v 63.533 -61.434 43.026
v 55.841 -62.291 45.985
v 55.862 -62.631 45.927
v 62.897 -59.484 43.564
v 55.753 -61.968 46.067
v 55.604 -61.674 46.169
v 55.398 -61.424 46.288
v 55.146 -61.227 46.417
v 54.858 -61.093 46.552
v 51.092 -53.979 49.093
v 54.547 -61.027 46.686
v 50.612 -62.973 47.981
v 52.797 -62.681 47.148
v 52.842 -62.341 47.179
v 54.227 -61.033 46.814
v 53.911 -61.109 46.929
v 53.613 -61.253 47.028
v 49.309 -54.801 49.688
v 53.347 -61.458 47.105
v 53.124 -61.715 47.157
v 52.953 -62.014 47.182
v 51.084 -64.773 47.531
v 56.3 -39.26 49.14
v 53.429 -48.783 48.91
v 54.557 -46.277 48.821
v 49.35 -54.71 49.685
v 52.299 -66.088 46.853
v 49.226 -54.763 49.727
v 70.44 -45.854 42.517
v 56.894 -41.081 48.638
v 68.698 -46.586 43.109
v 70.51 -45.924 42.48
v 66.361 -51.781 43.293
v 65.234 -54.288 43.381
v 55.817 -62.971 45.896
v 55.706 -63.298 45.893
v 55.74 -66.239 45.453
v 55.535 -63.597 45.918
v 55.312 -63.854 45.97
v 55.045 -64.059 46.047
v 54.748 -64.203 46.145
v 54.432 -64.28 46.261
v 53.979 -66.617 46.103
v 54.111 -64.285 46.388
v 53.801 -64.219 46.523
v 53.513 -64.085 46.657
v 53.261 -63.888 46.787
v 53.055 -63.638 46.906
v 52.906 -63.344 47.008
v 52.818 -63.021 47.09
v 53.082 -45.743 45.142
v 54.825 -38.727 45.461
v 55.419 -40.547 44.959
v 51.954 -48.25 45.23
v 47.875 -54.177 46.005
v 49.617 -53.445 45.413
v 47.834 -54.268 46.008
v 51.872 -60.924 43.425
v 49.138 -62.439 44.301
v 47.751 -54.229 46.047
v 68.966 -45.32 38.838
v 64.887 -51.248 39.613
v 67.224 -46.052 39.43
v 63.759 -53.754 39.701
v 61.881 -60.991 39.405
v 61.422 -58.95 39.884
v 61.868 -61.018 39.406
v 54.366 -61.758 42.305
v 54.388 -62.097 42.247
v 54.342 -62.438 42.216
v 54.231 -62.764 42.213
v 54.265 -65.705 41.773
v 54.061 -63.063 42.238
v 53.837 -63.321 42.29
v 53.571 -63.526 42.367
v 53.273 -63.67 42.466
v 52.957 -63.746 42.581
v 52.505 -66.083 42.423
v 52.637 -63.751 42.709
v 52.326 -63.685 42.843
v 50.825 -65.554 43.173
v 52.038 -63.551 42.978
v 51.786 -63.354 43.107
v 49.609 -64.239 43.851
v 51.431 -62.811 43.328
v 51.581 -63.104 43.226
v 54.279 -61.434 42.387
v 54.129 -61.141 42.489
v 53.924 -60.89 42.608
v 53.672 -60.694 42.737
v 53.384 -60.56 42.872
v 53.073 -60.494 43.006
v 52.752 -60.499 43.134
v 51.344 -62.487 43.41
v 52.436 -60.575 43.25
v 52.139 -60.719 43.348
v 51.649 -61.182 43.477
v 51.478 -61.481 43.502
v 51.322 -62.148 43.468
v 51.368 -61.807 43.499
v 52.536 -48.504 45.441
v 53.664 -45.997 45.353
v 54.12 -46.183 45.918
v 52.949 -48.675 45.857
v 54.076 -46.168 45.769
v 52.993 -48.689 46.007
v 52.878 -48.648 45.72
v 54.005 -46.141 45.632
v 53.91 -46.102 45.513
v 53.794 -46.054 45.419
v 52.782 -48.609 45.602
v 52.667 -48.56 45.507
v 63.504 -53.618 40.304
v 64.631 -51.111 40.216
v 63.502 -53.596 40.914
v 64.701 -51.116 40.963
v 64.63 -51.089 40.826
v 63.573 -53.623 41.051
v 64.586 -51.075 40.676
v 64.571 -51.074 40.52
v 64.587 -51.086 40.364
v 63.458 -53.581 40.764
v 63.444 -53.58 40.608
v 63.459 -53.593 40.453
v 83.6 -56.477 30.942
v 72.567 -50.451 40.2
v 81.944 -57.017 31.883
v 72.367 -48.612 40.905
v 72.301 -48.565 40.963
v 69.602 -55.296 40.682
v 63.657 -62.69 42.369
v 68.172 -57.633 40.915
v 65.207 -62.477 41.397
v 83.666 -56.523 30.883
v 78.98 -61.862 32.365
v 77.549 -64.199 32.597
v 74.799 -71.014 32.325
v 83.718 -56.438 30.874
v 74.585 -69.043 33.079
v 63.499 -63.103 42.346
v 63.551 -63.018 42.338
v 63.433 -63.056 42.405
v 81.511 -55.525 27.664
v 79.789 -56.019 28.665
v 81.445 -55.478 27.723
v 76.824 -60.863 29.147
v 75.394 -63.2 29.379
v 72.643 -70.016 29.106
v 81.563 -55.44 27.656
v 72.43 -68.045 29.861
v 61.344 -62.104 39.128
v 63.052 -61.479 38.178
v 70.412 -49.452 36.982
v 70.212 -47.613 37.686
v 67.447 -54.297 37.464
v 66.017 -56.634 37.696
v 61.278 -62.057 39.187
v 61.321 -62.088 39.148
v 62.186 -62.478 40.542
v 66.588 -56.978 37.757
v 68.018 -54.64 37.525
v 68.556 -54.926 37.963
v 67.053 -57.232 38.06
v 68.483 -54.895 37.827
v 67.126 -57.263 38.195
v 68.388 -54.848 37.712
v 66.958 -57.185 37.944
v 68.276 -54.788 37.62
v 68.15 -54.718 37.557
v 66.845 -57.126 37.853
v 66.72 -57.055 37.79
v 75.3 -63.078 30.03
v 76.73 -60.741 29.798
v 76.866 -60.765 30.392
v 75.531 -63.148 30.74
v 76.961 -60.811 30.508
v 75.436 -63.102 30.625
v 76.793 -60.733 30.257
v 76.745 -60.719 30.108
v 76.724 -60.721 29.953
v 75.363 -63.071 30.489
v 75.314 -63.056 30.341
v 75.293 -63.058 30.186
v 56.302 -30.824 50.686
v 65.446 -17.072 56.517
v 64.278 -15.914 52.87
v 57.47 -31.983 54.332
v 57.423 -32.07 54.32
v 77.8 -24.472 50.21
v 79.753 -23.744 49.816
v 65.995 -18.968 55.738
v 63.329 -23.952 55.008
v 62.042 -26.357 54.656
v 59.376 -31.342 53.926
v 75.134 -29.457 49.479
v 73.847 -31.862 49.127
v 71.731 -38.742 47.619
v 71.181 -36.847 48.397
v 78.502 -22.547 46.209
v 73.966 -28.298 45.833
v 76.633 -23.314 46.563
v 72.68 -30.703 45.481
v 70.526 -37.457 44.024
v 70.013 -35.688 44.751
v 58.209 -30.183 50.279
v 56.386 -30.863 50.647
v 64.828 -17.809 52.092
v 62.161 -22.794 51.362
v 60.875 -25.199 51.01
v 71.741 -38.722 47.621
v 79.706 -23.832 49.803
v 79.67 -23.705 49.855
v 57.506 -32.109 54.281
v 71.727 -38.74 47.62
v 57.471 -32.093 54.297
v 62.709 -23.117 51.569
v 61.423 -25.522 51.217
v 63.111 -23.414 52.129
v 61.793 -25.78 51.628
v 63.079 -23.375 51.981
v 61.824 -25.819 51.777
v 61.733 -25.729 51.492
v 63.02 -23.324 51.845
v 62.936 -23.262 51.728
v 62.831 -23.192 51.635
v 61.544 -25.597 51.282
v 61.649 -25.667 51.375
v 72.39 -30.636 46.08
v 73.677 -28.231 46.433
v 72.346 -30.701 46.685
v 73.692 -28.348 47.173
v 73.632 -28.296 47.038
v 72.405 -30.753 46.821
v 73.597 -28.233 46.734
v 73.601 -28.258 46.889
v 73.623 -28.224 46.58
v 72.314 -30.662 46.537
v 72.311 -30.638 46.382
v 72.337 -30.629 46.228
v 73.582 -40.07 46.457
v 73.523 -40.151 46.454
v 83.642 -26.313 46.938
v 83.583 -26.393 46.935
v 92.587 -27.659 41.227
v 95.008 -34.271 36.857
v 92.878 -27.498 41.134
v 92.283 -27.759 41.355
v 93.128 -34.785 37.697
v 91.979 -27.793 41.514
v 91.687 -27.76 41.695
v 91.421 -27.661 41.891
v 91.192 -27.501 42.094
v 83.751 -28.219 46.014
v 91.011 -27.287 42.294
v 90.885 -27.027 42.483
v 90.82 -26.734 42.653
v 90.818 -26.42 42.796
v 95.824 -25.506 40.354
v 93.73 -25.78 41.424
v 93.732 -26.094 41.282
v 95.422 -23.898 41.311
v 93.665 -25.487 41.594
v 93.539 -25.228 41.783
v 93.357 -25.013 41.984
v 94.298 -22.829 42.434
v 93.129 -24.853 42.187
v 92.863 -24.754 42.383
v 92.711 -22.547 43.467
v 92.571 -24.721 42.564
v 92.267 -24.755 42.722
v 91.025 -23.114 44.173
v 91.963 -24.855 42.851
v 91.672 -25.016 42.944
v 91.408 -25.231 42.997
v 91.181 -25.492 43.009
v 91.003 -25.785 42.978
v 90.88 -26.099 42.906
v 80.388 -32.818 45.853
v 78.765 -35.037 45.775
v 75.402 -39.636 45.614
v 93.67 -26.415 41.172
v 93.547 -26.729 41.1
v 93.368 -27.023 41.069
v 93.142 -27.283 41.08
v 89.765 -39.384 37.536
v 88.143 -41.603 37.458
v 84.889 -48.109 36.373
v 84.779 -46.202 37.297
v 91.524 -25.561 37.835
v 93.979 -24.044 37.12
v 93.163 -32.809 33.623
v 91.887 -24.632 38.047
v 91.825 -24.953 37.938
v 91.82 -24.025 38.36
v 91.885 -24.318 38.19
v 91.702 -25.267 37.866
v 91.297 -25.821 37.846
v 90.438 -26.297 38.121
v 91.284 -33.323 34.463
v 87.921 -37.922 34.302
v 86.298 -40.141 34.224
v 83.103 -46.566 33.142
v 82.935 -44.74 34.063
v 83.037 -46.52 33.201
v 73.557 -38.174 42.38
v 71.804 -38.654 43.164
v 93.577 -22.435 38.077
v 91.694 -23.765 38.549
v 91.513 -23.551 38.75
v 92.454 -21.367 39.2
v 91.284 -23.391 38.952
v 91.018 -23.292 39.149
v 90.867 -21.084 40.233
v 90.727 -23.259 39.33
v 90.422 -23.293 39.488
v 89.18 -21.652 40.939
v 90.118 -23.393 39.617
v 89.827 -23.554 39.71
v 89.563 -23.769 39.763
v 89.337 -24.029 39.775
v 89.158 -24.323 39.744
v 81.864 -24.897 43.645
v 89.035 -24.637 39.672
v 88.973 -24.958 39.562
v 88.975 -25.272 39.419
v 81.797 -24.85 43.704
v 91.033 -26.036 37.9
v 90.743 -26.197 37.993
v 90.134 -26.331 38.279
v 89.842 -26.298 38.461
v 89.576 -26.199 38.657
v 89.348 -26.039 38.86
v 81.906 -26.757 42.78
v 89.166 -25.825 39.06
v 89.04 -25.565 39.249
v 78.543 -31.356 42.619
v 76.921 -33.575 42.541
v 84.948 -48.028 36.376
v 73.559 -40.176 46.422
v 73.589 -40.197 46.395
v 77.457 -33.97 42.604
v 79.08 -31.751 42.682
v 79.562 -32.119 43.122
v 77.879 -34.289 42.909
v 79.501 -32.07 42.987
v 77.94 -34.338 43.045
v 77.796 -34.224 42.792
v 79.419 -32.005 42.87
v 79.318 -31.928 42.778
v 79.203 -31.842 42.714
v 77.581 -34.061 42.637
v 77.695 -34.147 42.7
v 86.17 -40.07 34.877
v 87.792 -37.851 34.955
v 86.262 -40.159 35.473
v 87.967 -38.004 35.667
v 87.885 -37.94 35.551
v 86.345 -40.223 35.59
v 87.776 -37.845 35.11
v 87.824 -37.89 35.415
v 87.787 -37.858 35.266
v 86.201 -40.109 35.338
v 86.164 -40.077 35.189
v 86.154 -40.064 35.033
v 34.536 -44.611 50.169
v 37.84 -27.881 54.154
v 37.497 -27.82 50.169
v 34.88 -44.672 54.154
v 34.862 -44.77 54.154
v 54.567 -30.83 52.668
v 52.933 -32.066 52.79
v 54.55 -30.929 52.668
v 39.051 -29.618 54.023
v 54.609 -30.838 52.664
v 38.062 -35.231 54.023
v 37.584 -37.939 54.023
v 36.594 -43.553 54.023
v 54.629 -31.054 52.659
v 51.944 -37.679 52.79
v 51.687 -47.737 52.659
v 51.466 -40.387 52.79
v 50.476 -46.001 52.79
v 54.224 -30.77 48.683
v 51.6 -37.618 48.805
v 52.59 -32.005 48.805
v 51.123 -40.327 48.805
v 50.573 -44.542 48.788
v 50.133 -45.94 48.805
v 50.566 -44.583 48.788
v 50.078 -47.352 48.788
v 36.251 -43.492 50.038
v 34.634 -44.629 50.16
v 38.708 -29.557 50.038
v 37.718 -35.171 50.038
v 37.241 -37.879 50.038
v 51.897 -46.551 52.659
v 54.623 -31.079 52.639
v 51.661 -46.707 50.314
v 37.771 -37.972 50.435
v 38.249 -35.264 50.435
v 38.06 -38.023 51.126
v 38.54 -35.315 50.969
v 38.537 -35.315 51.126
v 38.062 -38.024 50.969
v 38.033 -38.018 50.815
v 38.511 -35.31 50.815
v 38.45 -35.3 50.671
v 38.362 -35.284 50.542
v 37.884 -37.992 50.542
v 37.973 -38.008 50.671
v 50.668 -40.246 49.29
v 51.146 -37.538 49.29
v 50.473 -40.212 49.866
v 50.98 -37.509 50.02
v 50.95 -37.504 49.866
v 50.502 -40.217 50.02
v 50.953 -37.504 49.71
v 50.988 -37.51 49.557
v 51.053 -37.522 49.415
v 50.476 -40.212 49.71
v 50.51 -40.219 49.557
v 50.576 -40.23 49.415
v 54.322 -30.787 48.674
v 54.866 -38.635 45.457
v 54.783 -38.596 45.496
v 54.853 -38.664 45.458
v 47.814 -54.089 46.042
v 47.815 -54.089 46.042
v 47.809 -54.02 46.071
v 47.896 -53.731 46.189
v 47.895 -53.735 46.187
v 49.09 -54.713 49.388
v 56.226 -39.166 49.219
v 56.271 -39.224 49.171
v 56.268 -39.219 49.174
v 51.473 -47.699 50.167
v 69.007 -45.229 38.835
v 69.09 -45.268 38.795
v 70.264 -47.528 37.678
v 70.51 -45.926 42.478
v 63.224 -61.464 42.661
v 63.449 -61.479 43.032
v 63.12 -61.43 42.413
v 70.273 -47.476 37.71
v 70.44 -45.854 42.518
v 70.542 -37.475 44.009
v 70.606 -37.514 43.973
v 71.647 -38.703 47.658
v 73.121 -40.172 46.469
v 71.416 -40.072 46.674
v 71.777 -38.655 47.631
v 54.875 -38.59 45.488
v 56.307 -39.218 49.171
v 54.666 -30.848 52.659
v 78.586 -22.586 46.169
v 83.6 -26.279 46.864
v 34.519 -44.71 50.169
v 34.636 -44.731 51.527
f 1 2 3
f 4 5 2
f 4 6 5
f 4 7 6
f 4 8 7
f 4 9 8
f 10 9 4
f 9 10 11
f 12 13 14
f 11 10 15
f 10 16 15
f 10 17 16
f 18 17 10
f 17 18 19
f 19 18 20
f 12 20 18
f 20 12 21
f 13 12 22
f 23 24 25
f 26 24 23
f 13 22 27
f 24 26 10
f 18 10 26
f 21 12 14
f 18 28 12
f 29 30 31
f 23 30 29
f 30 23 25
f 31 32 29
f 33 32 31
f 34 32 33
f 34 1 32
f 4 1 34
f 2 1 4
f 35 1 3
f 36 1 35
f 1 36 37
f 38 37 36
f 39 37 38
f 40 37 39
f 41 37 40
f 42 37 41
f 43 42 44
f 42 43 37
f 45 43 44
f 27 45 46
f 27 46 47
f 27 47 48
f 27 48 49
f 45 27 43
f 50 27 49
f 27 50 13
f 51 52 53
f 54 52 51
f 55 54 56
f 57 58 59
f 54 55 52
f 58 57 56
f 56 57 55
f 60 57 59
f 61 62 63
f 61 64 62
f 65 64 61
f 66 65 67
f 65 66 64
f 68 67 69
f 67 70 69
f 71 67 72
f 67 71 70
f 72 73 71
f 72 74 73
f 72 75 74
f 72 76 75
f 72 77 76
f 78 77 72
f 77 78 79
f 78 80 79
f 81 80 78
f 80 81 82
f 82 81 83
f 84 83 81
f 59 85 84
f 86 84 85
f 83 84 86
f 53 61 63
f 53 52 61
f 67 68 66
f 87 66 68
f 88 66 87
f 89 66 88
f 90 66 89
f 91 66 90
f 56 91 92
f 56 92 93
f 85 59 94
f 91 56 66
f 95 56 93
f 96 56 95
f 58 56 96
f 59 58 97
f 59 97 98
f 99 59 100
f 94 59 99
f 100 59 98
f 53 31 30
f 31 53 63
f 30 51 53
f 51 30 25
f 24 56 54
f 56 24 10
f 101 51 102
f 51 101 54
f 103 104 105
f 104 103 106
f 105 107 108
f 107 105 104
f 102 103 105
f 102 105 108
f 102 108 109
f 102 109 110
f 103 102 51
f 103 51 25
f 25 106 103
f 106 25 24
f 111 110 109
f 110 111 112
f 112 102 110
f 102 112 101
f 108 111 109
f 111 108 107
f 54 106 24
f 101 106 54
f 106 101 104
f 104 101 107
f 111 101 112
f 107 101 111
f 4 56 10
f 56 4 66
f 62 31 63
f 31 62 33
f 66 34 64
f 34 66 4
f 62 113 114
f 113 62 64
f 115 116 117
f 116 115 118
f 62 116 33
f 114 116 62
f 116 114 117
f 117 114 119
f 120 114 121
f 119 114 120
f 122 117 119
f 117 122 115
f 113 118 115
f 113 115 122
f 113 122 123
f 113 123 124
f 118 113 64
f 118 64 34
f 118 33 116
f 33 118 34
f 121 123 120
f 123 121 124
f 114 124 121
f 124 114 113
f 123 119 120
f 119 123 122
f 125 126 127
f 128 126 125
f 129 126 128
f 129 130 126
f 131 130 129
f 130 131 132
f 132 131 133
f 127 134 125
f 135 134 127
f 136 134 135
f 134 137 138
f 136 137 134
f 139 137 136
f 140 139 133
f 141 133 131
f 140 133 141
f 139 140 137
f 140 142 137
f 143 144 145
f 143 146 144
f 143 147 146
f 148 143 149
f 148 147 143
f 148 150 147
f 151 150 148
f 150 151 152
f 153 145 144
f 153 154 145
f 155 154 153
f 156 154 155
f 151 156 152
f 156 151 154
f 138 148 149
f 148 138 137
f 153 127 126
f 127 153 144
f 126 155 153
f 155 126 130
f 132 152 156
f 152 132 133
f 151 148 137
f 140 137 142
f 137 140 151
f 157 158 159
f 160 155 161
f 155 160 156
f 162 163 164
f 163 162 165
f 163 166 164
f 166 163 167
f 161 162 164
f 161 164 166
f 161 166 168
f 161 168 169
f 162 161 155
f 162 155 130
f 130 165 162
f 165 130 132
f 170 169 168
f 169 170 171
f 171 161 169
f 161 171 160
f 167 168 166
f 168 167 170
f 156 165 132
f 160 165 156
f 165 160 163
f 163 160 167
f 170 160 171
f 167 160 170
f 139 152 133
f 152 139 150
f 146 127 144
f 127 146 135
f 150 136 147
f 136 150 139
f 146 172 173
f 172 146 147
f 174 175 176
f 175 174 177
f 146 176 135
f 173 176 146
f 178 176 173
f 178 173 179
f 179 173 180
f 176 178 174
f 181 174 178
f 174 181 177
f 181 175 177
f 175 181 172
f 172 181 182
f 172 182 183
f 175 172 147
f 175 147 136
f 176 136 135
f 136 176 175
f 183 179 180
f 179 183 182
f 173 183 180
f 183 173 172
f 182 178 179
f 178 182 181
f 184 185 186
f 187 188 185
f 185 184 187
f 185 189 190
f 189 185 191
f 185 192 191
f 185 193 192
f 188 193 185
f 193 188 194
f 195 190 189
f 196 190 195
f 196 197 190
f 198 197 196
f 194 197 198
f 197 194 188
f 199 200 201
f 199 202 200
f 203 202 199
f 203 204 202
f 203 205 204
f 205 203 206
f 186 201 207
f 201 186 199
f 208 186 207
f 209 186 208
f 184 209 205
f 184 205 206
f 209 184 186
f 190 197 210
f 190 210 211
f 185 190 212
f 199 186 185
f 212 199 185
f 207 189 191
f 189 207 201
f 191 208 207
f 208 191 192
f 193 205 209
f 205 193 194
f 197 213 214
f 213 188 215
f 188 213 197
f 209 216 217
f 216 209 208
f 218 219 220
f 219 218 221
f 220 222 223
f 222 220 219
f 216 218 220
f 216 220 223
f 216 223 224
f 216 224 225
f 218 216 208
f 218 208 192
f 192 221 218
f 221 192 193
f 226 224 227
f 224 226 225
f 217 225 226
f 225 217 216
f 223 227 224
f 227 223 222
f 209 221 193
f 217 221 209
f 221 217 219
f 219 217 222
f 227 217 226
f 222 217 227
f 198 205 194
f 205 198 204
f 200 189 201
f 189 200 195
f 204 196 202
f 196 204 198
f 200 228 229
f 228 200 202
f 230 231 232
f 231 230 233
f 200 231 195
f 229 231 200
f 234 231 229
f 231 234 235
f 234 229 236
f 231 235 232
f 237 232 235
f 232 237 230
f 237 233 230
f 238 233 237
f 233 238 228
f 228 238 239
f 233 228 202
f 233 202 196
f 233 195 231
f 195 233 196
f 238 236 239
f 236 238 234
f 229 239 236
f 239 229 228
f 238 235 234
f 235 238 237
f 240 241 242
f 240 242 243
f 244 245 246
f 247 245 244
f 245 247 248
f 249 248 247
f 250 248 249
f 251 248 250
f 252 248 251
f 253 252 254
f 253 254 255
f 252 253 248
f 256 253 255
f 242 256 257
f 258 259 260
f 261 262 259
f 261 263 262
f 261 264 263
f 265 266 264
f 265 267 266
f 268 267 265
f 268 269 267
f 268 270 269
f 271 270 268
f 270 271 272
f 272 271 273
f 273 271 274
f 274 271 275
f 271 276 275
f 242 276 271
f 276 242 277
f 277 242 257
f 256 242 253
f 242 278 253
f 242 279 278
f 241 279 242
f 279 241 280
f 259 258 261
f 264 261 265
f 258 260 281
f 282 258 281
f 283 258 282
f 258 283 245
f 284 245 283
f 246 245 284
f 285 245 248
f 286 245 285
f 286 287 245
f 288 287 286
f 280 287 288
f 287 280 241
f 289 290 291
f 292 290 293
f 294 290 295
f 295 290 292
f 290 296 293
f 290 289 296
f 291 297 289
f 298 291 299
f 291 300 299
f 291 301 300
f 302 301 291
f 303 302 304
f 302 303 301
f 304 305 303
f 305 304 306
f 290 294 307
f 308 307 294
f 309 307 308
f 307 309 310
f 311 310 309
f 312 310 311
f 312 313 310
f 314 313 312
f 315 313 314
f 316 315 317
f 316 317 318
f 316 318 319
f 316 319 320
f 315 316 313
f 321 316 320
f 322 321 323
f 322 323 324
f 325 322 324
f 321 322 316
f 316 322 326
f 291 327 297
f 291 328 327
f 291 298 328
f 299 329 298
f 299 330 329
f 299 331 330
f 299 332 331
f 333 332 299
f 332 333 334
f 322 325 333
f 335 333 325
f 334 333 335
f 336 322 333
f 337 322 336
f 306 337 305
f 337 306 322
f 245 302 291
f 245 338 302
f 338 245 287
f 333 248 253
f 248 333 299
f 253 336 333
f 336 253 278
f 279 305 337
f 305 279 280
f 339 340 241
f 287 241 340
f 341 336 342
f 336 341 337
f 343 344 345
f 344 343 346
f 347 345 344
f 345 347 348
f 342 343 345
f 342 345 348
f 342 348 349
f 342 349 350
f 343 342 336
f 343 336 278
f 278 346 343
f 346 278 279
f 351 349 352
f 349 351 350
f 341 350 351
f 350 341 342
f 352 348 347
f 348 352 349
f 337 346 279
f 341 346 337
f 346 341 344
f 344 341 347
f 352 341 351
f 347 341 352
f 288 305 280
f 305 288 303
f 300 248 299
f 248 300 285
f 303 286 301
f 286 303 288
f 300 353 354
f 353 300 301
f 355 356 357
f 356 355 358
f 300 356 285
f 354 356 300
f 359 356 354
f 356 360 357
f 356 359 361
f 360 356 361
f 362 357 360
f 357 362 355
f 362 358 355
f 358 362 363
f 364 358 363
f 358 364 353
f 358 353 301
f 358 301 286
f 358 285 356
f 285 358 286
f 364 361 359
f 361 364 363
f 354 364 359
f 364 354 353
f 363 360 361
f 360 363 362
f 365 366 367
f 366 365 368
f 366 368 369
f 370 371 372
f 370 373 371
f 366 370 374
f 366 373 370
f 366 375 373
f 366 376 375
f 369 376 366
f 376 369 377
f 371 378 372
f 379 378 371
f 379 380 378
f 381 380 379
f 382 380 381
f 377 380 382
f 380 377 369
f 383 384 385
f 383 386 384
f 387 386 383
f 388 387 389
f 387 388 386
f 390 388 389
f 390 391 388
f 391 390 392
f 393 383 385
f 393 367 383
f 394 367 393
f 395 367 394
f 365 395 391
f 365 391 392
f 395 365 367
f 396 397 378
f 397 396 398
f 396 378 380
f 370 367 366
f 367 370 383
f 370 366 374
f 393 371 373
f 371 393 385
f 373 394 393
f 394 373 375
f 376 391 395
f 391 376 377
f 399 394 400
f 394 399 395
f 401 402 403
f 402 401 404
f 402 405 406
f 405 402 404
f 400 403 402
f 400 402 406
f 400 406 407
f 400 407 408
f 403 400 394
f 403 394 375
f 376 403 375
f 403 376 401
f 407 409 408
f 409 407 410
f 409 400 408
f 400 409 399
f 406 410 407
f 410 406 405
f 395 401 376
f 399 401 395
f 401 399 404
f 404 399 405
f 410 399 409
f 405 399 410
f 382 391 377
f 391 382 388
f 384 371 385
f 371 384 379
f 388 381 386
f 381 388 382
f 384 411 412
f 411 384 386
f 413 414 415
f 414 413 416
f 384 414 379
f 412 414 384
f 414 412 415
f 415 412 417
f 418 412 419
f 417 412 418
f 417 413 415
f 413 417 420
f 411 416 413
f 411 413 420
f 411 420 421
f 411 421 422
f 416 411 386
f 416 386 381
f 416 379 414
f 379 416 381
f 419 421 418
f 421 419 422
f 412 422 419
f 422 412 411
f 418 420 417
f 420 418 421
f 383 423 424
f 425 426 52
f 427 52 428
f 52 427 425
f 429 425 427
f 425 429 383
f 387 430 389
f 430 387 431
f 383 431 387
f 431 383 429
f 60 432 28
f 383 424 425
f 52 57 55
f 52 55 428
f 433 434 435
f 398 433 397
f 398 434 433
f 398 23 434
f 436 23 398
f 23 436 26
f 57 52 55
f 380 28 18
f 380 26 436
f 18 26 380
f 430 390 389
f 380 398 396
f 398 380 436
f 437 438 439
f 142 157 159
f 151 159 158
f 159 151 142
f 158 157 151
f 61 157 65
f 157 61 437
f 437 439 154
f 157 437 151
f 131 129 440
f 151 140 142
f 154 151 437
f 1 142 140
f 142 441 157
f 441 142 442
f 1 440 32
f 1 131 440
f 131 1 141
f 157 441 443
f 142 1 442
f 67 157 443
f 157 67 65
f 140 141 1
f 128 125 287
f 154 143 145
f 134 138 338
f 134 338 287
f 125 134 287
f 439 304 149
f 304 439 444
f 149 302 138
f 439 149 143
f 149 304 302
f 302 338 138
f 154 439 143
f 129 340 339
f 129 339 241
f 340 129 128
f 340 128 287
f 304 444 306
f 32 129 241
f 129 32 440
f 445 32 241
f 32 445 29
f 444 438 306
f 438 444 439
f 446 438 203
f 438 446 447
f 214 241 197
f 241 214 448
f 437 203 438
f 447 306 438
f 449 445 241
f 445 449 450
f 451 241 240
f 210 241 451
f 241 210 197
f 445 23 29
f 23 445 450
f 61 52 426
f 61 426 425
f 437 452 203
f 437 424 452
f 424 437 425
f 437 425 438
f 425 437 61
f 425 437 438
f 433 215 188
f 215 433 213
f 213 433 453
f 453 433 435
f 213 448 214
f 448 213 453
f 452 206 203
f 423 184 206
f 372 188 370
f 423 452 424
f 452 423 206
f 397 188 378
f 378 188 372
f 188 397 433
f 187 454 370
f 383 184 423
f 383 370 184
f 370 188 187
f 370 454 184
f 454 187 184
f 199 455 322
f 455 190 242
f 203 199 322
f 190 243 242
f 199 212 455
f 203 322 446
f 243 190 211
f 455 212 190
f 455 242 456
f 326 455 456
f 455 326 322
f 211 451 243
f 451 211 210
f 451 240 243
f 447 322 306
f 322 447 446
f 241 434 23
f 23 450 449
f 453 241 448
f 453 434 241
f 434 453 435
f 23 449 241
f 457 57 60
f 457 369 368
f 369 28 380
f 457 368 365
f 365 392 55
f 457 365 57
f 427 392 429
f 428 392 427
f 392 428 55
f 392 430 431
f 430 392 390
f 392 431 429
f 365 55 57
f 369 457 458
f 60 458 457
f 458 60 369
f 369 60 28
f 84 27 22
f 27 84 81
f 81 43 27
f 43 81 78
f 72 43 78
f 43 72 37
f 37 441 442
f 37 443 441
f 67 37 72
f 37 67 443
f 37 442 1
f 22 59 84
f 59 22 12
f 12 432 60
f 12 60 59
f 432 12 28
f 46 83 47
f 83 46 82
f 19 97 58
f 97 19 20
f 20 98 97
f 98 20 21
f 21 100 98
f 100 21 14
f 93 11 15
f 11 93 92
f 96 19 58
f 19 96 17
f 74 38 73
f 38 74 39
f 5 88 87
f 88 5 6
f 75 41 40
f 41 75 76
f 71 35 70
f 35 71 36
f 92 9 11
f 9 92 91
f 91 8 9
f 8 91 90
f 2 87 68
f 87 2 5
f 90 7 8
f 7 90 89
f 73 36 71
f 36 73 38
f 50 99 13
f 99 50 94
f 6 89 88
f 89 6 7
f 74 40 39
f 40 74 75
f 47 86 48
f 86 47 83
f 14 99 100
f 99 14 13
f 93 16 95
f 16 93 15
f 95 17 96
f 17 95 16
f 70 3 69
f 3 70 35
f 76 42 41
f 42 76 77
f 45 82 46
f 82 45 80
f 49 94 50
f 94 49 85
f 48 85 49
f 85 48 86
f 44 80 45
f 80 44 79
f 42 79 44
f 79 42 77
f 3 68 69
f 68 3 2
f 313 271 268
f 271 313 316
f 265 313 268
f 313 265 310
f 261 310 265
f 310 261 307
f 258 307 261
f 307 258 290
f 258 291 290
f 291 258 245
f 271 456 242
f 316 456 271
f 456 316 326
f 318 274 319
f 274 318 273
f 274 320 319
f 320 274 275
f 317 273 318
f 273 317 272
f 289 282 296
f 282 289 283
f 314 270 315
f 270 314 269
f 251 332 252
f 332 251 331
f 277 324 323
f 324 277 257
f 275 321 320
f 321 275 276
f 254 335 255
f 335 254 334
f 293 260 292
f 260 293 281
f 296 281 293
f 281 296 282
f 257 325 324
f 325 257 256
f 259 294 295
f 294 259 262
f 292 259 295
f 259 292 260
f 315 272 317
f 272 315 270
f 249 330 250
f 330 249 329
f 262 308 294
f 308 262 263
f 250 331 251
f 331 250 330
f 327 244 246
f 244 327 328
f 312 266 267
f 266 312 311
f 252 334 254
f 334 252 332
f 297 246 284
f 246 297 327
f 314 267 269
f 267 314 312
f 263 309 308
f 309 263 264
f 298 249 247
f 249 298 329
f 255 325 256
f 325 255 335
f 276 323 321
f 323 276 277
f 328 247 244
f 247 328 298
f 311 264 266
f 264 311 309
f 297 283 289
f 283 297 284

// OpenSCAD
mirror ([-1, 0, 0]) {
  union () {
    union () {
      union () {
        union () {
          translate ([-22, -36, -3]) {
            translate ([-36.42059678255161, -13.748592644796744, 45.42143047760381]) {
              rotate (a=25.0, v=[0, 0, 1]) {
                rotate (a=-23.000000000000004, v=[0, 1, 0]) {
                  rotate (a=-1.9999999999999998, v=[1, 0, 0]) {
                    union () {
                      union () {
                        translate ([0, 7.825, 2]) {
                          cube ([17.15, 1.5, 4], center=true);
                        }
                        translate ([7.825, 0, 2]) {
                          cube ([1.5, 17.15, 4], center=true);
                        }
                        translate ([0, 0, 0]) {
                          hull () {
                            translate ([7.825, 0, 2]) {
                              cube ([1.5, 2.75, 4], center=true);
                            }
                            translate ([7.075, 0, 1]) {
                              rotate (a=90.0, v=[1, 0, 0]) {
                                cylinder ($fn=30, h=2.75, r=0.75, center=true);
                              }
                            }
                          }
                        }
                      }
                      mirror ([0, 1, 0]) {
                        mirror ([1, 0, 0]) {
                          union () {
                            translate ([0, 7.825, 2]) {
                              cube ([17.15, 1.5, 4], center=true);
                            }
                            translate ([7.825, 0, 2]) {
                              cube ([1.5, 17.15, 4], center=true);
                            }
                            translate ([0, 0, 0]) {
                              hull () {
                                translate ([7.825, 0, 2]) {
                                  cube ([1.5, 2.75, 4], center=true);
                                }
                                translate ([7.075, 0, 1]) {
                                  rotate (a=90.0, v=[1, 0, 0]) {
                                    cylinder ($fn=30, h=2.75, r=0.75, center=true);
                                  }
                                }
                              }
                            }
                          }
                        }
                      }
                    }
                  }
                }
              }
            }
          }
          translate ([-35, -45, -12]) {
            translate ([-36.42059678255161, -13.748592644796744, 45.42143047760381]) {
              rotate (a=34.99999999999999, v=[0, 0, 1]) {
                rotate (a=-36.0, v=[0, 1, 0]) {
                  rotate (a=-6.0, v=[1, 0, 0]) {
                    union () {
                      union () {
                        translate ([0, 7.825, 2]) {
                          cube ([17.15, 1.5, 4], center=true);
                        }
                        translate ([7.825, 0, 2]) {
                          cube ([1.5, 17.15, 4], center=true);
                        }
                        translate ([0, 0, 0]) {
                          hull () {
                            translate ([7.825, 0, 2]) {
                              cube ([1.5, 2.75, 4], center=true);
                            }
                            translate ([7.075, 0, 1]) {
                              rotate (a=90.0, v=[1, 0, 0]) {
                                cylinder ($fn=30, h=2.75, r=0.75, center=true);
                              }
                            }
                          }
                        }
                      }
                      mirror ([0, 1, 0]) {
                        mirror ([1, 0, 0]) {
                          union () {
                            translate ([0, 7.825, 2]) {
                              cube ([17.15, 1.5, 4], center=true);
                            }
                            translate ([7.825, 0, 2]) {
                              cube ([1.5, 17.15, 4], center=true);
                            }
                            translate ([0, 0, 0]) {
                              hull () {
                                translate ([7.825, 0, 2]) {
                                  cube ([1.5, 2.75, 4], center=true);
                                }
                                translate ([7.075, 0, 1]) {
                                  rotate (a=90.0, v=[1, 0, 0]) {
                                    cylinder ($fn=30, h=2.75, r=0.75, center=true);
                                  }
                                }
                              }
                            }
                          }
                        }
                      }
                    }
                  }
                }
              }
            }
          }
          translate ([-31, -13, 3]) {
            translate ([-36.42059678255161, -13.748592644796744, 45.42143047760381]) {
              rotate (a=25.0, v=[0, 0, 1]) {
                rotate (a=-23.000000000000004, v=[0, 1, 0]) {
                  rotate (a=7.999999999999999, v=[1, 0, 0]) {
                    union () {
                      union () {
                        translate ([0, 7.825, 2]) {
                          cube ([17.15, 1.5, 4], center=true);
                        }
                        translate ([7.825, 0, 2]) {
                          cube ([1.5, 17.15, 4], center=true);
                        }
                        translate ([0, 0, 0]) {
                          hull () {
                            translate ([7.825, 0, 2]) {
                              cube ([1.5, 2.75, 4], center=true);
                            }
                            translate ([7.075, 0, 1]) {
                              rotate (a=90.0, v=[1, 0, 0]) {
                                cylinder ($fn=30, h=2.75, r=0.75, center=true);
                              }
                            }
                          }
                        }
                      }
                      mirror ([0, 1, 0]) {
                        mirror ([1, 0, 0]) {
                          union () {
                            translate ([0, 7.825, 2]) {
                              cube ([17.15, 1.5, 4], center=true);
                            }
                            translate ([7.825, 0, 2]) {
                              cube ([1.5, 17.15, 4], center=true);
                            }
                            translate ([0, 0, 0]) {
                              hull () {
                                translate ([7.825, 0, 2]) {
                                  cube ([1.5, 2.75, 4], center=true);
                                }
                                translate ([7.075, 0, 1]) {
                                  rotate (a=90.0, v=[1, 0, 0]) {
                                    cylinder ($fn=30, h=2.75, r=0.75, center=true);
                                  }
                                }
                              }
                            }
                          }
                        }
                      }
                    }
                  }
                }
              }
            }
          }
          translate ([-46, -22, -7]) {
            translate ([-36.42059678255161, -13.748592644796744, 45.42143047760381]) {
              rotate (a=34.99999999999999, v=[0, 0, 1]) {
                rotate (a=-36.0, v=[0, 1, 0]) {
                  rotate (a=1.9999999999999998, v=[1, 0, 0]) {
                    union () {
                      union () {
                        translate ([0, 7.825, 2]) {
                          cube ([17.15, 1.5, 4], center=true);
                        }
                        translate ([7.825, 0, 2]) {
                          cube ([1.5, 17.15, 4], center=true);
                        }
                        translate ([0, 0, 0]) {
                          hull () {
                            translate ([7.825, 0, 2]) {
                              cube ([1.5, 2.75, 4], center=true);
                            }
                            translate ([7.075, 0, 1]) {
                              rotate (a=90.0, v=[1, 0, 0]) {
                                cylinder ($fn=30, h=2.75, r=0.75, center=true);
                              }
                            }
                          }
                        }
                      }
                      mirror ([0, 1, 0]) {
                        mirror ([1, 0, 0]) {
                          union () {
                            translate ([0, 7.825, 2]) {
                              cube ([17.15, 1.5, 4], center=true);
                            }
                            translate ([7.825, 0, 2]) {
                              cube ([1.5, 17.15, 4], center=true);
                            }
                            translate ([0, 0, 0]) {
                              hull () {
                                translate ([7.825, 0, 2]) {
                                  cube ([1.5, 2.75, 4], center=true);
                                }
                                translate ([7.075, 0, 1]) {
                                  rotate (a=90.0, v=[1, 0, 0]) {
                                    cylinder ($fn=30, h=2.75, r=0.75, center=true);
                                  }
                                }
                              }
                            }
                          }
                        }
                      }
                    }
                  }
                }
              }
            }
          }
        }
        union () {
          translate ([-8, -24, 4]) {
            translate ([-36.42059678255161, -13.748592644796744, 45.42143047760381]) {
              rotate (a=10.000000000000002, v=[0, 0, 1]) {
                rotate (a=-5.000000000000001, v=[0, 1, 0]) {
                  rotate (a=0.0, v=[1, 0, 0]) {
                    union () {
                      union () {
                        translate ([0, 7.825, 2]) {
                          cube ([17.15, 1.5, 4], center=true);
                        }
                        translate ([7.825, 0, 2]) {
                          cube ([1.5, 17.15, 4], center=true);
                        }
                        translate ([0, 0, 0]) {
                          hull () {
                            translate ([7.825, 0, 2]) {
                              cube ([1.5, 2.75, 4], center=true);
                            }
                            translate ([7.075, 0, 1]) {
                              rotate (a=90.0, v=[1, 0, 0]) {
                                cylinder ($fn=30, h=2.75, r=0.75, center=true);
                              }
                            }
                          }
                        }
                      }
                      mirror ([0, 1, 0]) {
                        mirror ([1, 0, 0]) {
                          union () {
                            translate ([0, 7.825, 2]) {
                              cube ([17.15, 1.5, 4], center=true);
                            }
                            translate ([7.825, 0, 2]) {
                              cube ([1.5, 17.15, 4], center=true);
                            }
                            translate ([0, 0, 0]) {
                              hull () {
                                translate ([7.825, 0, 2]) {
                                  cube ([1.5, 2.75, 4], center=true);
                                }
                                translate ([7.075, 0, 1]) {
                                  rotate (a=90.0, v=[1, 0, 0]) {
                                    cylinder ($fn=30, h=2.75, r=0.75, center=true);
                                  }
                                }
                              }
                            }
                          }
                        }
                      }
                    }
                  }
                }
              }
            }
          }
        }
      }
      union () {
        union () {
          hull () {
            translate ([-22, -36, -3]) {
              translate ([-36.42059678255161, -13.748592644796744, 45.42143047760381]) {
                rotate (a=25.0, v=[0, 0, 1]) {
                  rotate (a=-23.000000000000004, v=[0, 1, 0]) {
                    rotate (a=-1.9999999999999998, v=[1, 0, 0]) {
                      translate ([8.524999999999999, 8.524999999999999, 0]) {
                        translate ([0, 0, 2]) {
                          cube ([0.1, 0.1, 4], center=true);
                        }
                      }
                    }
                  }
                }
              }
            }
            translate ([-22, -36, -3]) {
              translate ([-36.42059678255161, -13.748592644796744, 45.42143047760381]) {
                rotate (a=25.0, v=[0, 0, 1]) {
                  rotate (a=-23.000000000000004, v=[0, 1, 0]) {
                    rotate (a=-1.9999999999999998, v=[1, 0, 0]) {
                      translate ([8.524999999999999, -8.524999999999999, 0]) {
                        translate ([0, 0, 2]) {
                          cube ([0.1, 0.1, 4], center=true);
                        }
                      }
                    }
                  }
                }
              }
            }
            translate ([-8, -24, 4]) {
              translate ([-36.42059678255161, -13.748592644796744, 45.42143047760381]) {
                rotate (a=10.000000000000002, v=[0, 0, 1]) {
                  rotate (a=-5.000000000000001, v=[0, 1, 0]) {
                    rotate (a=0.0, v=[1, 0, 0]) {
                      translate ([-8.524999999999999, 8.524999999999999, 0]) {
                        translate ([0, 0, 2]) {
                          cube ([0.1, 0.1, 4], center=true);
                        }
                      }
                    }
                  }
                }
              }
            }
          }
          hull () {
            translate ([-22, -36, -3]) {
              translate ([-36.42059678255161, -13.748592644796744, 45.42143047760381]) {
                rotate (a=25.0, v=[0, 0, 1]) {
                  rotate (a=-23.000000000000004, v=[0, 1, 0]) {
                    rotate (a=-1.9999999999999998, v=[1, 0, 0]) {
                      translate ([8.524999999999999, -8.524999999999999, 0]) {
                        translate ([0, 0, 2]) {
                          cube ([0.1, 0.1, 4], center=true);
                        }
                      }
                    }
                  }
                }
              }
            }
            translate ([-8, -24, 4]) {
              translate ([-36.42059678255161, -13.748592644796744, 45.42143047760381]) {
                rotate (a=10.000000000000002, v=[0, 0, 1]) {
                  rotate (a=-5.000000000000001, v=[0, 1, 0]) {
                    rotate (a=0.0, v=[1, 0, 0]) {
                      translate ([-8.524999999999999, 8.524999999999999, 0]) {
                        translate ([0, 0, 2]) {
                          cube ([0.1, 0.1, 4], center=true);
                        }
                      }
                    }
                  }
                }
              }
            }
            translate ([-8, -24, 4]) {
              translate ([-36.42059678255161, -13.748592644796744, 45.42143047760381]) {
                rotate (a=10.000000000000002, v=[0, 0, 1]) {
                  rotate (a=-5.000000000000001, v=[0, 1, 0]) {
                    rotate (a=0.0, v=[1, 0, 0]) {
                      translate ([-8.524999999999999, -8.524999999999999, 0]) {
                        translate ([0, 0, 2]) {
                          cube ([0.1, 0.1, 4], center=true);
                        }
                      }
                    }
                  }
                }
              }
            }
          }
        }
        union () {
          hull () {
            translate ([-35, -45, -12]) {
              translate ([-36.42059678255161, -13.748592644796744, 45.42143047760381]) {
                rotate (a=34.99999999999999, v=[0, 0, 1]) {
                  rotate (a=-36.0, v=[0, 1, 0]) {
                    rotate (a=-6.0, v=[1, 0, 0]) {
                      translate ([8.524999999999999, 8.524999999999999, 0]) {
                        translate ([0, 0, 2]) {
                          cube ([0.1, 0.1, 4], center=true);
                        }
                      }
                    }
                  }
                }
              }
            }
            translate ([-35, -45, -12]) {
              translate ([-36.42059678255161, -13.748592644796744, 45.42143047760381]) {
                rotate (a=34.99999999999999, v=[0, 0, 1]) {
                  rotate (a=-36.0, v=[0, 1, 0]) {
                    rotate (a=-6.0, v=[1, 0, 0]) {
                      translate ([8.524999999999999, -8.524999999999999, 0]) {
                        translate ([0, 0, 2]) {
                          cube ([0.1, 0.1, 4], center=true);
                        }
                      }
                    }
                  }
                }
              }
            }
            translate ([-22, -36, -3]) {
              translate ([-36.42059678255161, -13.748592644796744, 45.42143047760381]) {
                rotate (a=25.0, v=[0, 0, 1]) {
                  rotate (a=-23.000000000000004, v=[0, 1, 0]) {
                    rotate (a=-1.9999999999999998, v=[1, 0, 0]) {
                      translate ([-8.524999999999999, 8.524999999999999, 0]) {
                        translate ([0, 0, 2]) {
                          cube ([0.1, 0.1, 4], center=true);
                        }
                      }
                    }
                  }
                }
              }
            }
          }
          hull () {
            translate ([-35, -45, -12]) {
              translate ([-36.42059678255161, -13.748592644796744, 45.42143047760381]) {
                rotate (a=34.99999999999999, v=[0, 0, 1]) {
                  rotate (a=-36.0, v=[0, 1, 0]) {
                    rotate (a=-6.0, v=[1, 0, 0]) {
                      translate ([8.524999999999999, -8.524999999999999, 0]) {
                        translate ([0, 0, 2]) {
                          cube ([0.1, 0.1, 4], center=true);
                        }
                      }
                    }
                  }
                }
              }
            }
            translate ([-22, -36, -3]) {
              translate ([-36.42059678255161, -13.748592644796744, 45.42143047760381]) {
                rotate (a=25.0, v=[0, 0, 1]) {
                  rotate (a=-23.000000000000004, v=[0, 1, 0]) {
                    rotate (a=-1.9999999999999998, v=[1, 0, 0]) {
                      translate ([-8.524999999999999, 8.524999999999999, 0]) {
                        translate ([0, 0, 2]) {
                          cube ([0.1, 0.1, 4], center=true);
                        }
                      }
                    }
                  }
                }
              }
            }
            translate ([-22, -36, -3]) {
              translate ([-36.42059678255161, -13.748592644796744, 45.42143047760381]) {
                rotate (a=25.0, v=[0, 0, 1]) {
                  rotate (a=-23.000000000000004, v=[0, 1, 0]) {
                    rotate (a=-1.9999999999999998, v=[1, 0, 0]) {
                      translate ([-8.524999999999999, -8.524999999999999, 0]) {
                        translate ([0, 0, 2]) {
                          cube ([0.1, 0.1, 4], center=true);
                        }
                      }
                    }
                  }
                }
              }
            }
          }
        }
        union () {
          hull () {
            translate ([-22, -36, -3]) {
              translate ([-36.42059678255161, -13.748592644796744, 45.42143047760381]) {
                rotate (a=25.0, v=[0, 0, 1]) {
                  rotate (a=-23.000000000000004, v=[0, 1, 0]) {
                    rotate (a=-1.9999999999999998, v=[1, 0, 0]) {
                      translate ([8.524999999999999, -8.524999999999999, 0]) {
                        translate ([0, 0, 2]) {
                          cube ([0.1, 0.1, 4], center=true);
                        }
                      }
                    }
                  }
                }
              }
            }
            translate ([-8, -24, 4]) {
              translate ([-36.42059678255161, -13.748592644796744, 45.42143047760381]) {
                rotate (a=10.000000000000002, v=[0, 0, 1]) {
                  rotate (a=-5.000000000000001, v=[0, 1, 0]) {
                    rotate (a=0.0, v=[1, 0, 0]) {
                      translate ([-8.524999999999999, -8.524999999999999, 0]) {
                        translate ([0, 0, 2]) {
                          cube ([0.1, 0.1, 4], center=true);
                        }
                      }
                    }
                  }
                }
              }
            }
            translate ([-8, -24, 4]) {
              translate ([-36.42059678255161, -13.748592644796744, 45.42143047760381]) {
                rotate (a=10.000000000000002, v=[0, 0, 1]) {
                  rotate (a=-5.000000000000001, v=[0, 1, 0]) {
                    rotate (a=0.0, v=[1, 0, 0]) {
                      translate ([8.524999999999999, -8.524999999999999, 0]) {
                        translate ([0, 0, 2]) {
                          cube ([0.1, 0.1, 4], center=true);
                        }
                      }
                    }
                  }
                }
              }
            }
          }
        }
        union () {
          hull () {
            translate ([-35, -45, -12]) {
              translate ([-36.42059678255161, -13.748592644796744, 45.42143047760381]) {
                rotate (a=34.99999999999999, v=[0, 0, 1]) {
                  rotate (a=-36.0, v=[0, 1, 0]) {
                    rotate (a=-6.0, v=[1, 0, 0]) {
                      translate ([-8.524999999999999, 8.524999999999999, 0]) {
                        translate ([0, 0, 2]) {
                          cube ([0.1, 0.1, 4], center=true);
                        }
                      }
                    }
                  }
                }
              }
            }
            translate ([-46, -22, -7]) {
              translate ([-36.42059678255161, -13.748592644796744, 45.42143047760381]) {
                rotate (a=34.99999999999999, v=[0, 0, 1]) {
                  rotate (a=-36.0, v=[0, 1, 0]) {
                    rotate (a=1.9999999999999998, v=[1, 0, 0]) {
                      translate ([-8.524999999999999, -8.524999999999999, 0]) {
                        translate ([0, 0, 2]) {
                          cube ([0.1, 0.1, 4], center=true);
                        }
                      }
                    }
                  }
                }
              }
            }
            translate ([-35, -45, -12]) {
              translate ([-36.42059678255161, -13.748592644796744, 45.42143047760381]) {
                rotate (a=34.99999999999999, v=[0, 0, 1]) {
                  rotate (a=-36.0, v=[0, 1, 0]) {
                    rotate (a=-6.0, v=[1, 0, 0]) {
                      translate ([8.524999999999999, 8.524999999999999, 0]) {
                        translate ([0, 0, 2]) {
                          cube ([0.1, 0.1, 4], center=true);
                        }
                      }
                    }
                  }
                }
              }
            }
          }
          hull () {
            translate ([-46, -22, -7]) {
              translate ([-36.42059678255161, -13.748592644796744, 45.42143047760381]) {
                rotate (a=34.99999999999999, v=[0, 0, 1]) {
                  rotate (a=-36.0, v=[0, 1, 0]) {
                    rotate (a=1.9999999999999998, v=[1, 0, 0]) {
                      translate ([-8.524999999999999, -8.524999999999999, 0]) {
                        translate ([0, 0, 2]) {
                          cube ([0.1, 0.1, 4], center=true);
                        }
                      }
                    }
                  }
                }
              }
            }
            translate ([-35, -45, -12]) {
              translate ([-36.42059678255161, -13.748592644796744, 45.42143047760381]) {
                rotate (a=34.99999999999999, v=[0, 0, 1]) {
                  rotate (a=-36.0, v=[0, 1, 0]) {
                    rotate (a=-6.0, v=[1, 0, 0]) {
                      translate ([8.524999999999999, 8.524999999999999, 0]) {
                        translate ([0, 0, 2]) {
                          cube ([0.1, 0.1, 4], center=true);
                        }
                      }
                    }
                  }
                }
              }
            }
            translate ([-46, -22, -7]) {
              translate ([-36.42059678255161, -13.748592644796744, 45.42143047760381]) {
                rotate (a=34.99999999999999, v=[0, 0, 1]) {
                  rotate (a=-36.0, v=[0, 1, 0]) {
                    rotate (a=1.9999999999999998, v=[1, 0, 0]) {
                      translate ([8.524999999999999, -8.524999999999999, 0]) {
                        translate ([0, 0, 2]) {
                          cube ([0.1, 0.1, 4], center=true);
                        }
                      }
                    }
                  }
                }
              }
            }
          }
          hull () {
            translate ([-35, -45, -12]) {
              translate ([-36.42059678255161, -13.748592644796744, 45.42143047760381]) {
                rotate (a=34.99999999999999, v=[0, 0, 1]) {
                  rotate (a=-36.0, v=[0, 1, 0]) {
                    rotate (a=-6.0, v=[1, 0, 0]) {
                      translate ([8.524999999999999, 8.524999999999999, 0]) {
                        translate ([0, 0, 2]) {
                          cube ([0.1, 0.1, 4], center=true);
                        }
                      }
                    }
                  }
                }
              }
            }
            translate ([-46, -22, -7]) {
              translate ([-36.42059678255161, -13.748592644796744, 45.42143047760381]) {
                rotate (a=34.99999999999999, v=[0, 0, 1]) {
                  rotate (a=-36.0, v=[0, 1, 0]) {
                    rotate (a=1.9999999999999998, v=[1, 0, 0]) {
                      translate ([8.524999999999999, -8.524999999999999, 0]) {
                        translate ([0, 0, 2]) {
                          cube ([0.1, 0.1, 4], center=true);
                        }
                      }
                    }
                  }
                }
              }
            }
            translate ([-22, -36, -3]) {
              translate ([-36.42059678255161, -13.748592644796744, 45.42143047760381]) {
                rotate (a=25.0, v=[0, 0, 1]) {
                  rotate (a=-23.000000000000004, v=[0, 1, 0]) {
                    rotate (a=-1.9999999999999998, v=[1, 0, 0]) {
                      translate ([-8.524999999999999, 8.524999999999999, 0]) {
                        translate ([0, 0, 2]) {
                          cube ([0.1, 0.1, 4], center=true);
                        }
                      }
                    }
                  }
                }
              }
            }
          }
          hull () {
            translate ([-46, -22, -7]) {
              translate ([-36.42059678255161, -13.748592644796744, 45.42143047760381]) {
                rotate (a=34.99999999999999, v=[0, 0, 1]) {
                  rotate (a=-36.0, v=[0, 1, 0]) {
                    rotate (a=1.9999999999999998, v=[1, 0, 0]) {
                      translate ([8.524999999999999, -8.524999999999999, 0]) {
                        translate ([0, 0, 2]) {
                          cube ([0.1, 0.1, 4], center=true);
                        }
                      }
                    }
                  }
                }
              }
            }
            translate ([-22, -36, -3]) {
              translate ([-36.42059678255161, -13.748592644796744, 45.42143047760381]) {
                rotate (a=25.0, v=[0, 0, 1]) {
                  rotate (a=-23.000000000000004, v=[0, 1, 0]) {
                    rotate (a=-1.9999999999999998, v=[1, 0, 0]) {
                      translate ([-8.524999999999999, 8.524999999999999, 0]) {
                        translate ([0, 0, 2]) {
                          cube ([0.1, 0.1, 4], center=true);
                        }
                      }
                    }
                  }
                }
              }
            }
            translate ([-31, -13, 3]) {
              translate ([-36.42059678255161, -13.748592644796744, 45.42143047760381]) {
                rotate (a=25.0, v=[0, 0, 1]) {
                  rotate (a=-23.000000000000004, v=[0, 1, 0]) {
                    rotate (a=7.999999999999999, v=[1, 0, 0]) {
                      translate ([-8.524999999999999, -8.524999999999999, 0]) {
                        translate ([0, 0, 2]) {
                          cube ([0.1, 0.1, 4], center=true);
                        }
                      }
                    }
                  }
                }
              }
            }
          }
          hull () {
            translate ([-22, -36, -3]) {
              translate ([-36.42059678255161, -13.748592644796744, 45.42143047760381]) {
                rotate (a=25.0, v=[0, 0, 1]) {
                  rotate (a=-23.000000000000004, v=[0, 1, 0]) {
                    rotate (a=-1.9999999999999998, v=[1, 0, 0]) {
                      translate ([-8.524999999999999, 8.524999999999999, 0]) {
                        translate ([0, 0, 2]) {
                          cube ([0.1, 0.1, 4], center=true);
                        }
                      }
                    }
                  }
                }
              }
            }
            translate ([-31, -13, 3]) {
              translate ([-36.42059678255161, -13.748592644796744, 45.42143047760381]) {
                rotate (a=25.0, v=[0, 0, 1]) {
                  rotate (a=-23.000000000000004, v=[0, 1, 0]) {
                    rotate (a=7.999999999999999, v=[1, 0, 0]) {
                      translate ([-8.524999999999999, -8.524999999999999, 0]) {
                        translate ([0, 0, 2]) {
                          cube ([0.1, 0.1, 4], center=true);
                        }
                      }
                    }
                  }
                }
              }
            }
            translate ([-22, -36, -3]) {
              translate ([-36.42059678255161, -13.748592644796744, 45.42143047760381]) {
                rotate (a=25.0, v=[0, 0, 1]) {
                  rotate (a=-23.000000000000004, v=[0, 1, 0]) {
                    rotate (a=-1.9999999999999998, v=[1, 0, 0]) {
                      translate ([8.524999999999999, 8.524999999999999, 0]) {
                        translate ([0, 0, 2]) {
                          cube ([0.1, 0.1, 4], center=true);
                        }
                      }
                    }
                  }
                }
              }
            }
          }
          hull () {
            translate ([-31, -13, 3]) {
              translate ([-36.42059678255161, -13.748592644796744, 45.42143047760381]) {
                rotate (a=25.0, v=[0, 0, 1]) {
                  rotate (a=-23.000000000000004, v=[0, 1, 0]) {
                    rotate (a=7.999999999999999, v=[1, 0, 0]) {
                      translate ([-8.524999999999999, -8.524999999999999, 0]) {
                        translate ([0, 0, 2]) {
                          cube ([0.1, 0.1, 4], center=true);
                        }
                      }
                    }
                  }
                }
              }
            }
            translate ([-22, -36, -3]) {
              translate ([-36.42059678255161, -13.748592644796744, 45.42143047760381]) {
                rotate (a=25.0, v=[0, 0, 1]) {
                  rotate (a=-23.000000000000004, v=[0, 1, 0]) {
                    rotate (a=-1.9999999999999998, v=[1, 0, 0]) {
                      translate ([8.524999999999999, 8.524999999999999, 0]) {
                        translate ([0, 0, 2]) {
                          cube ([0.1, 0.1, 4], center=true);
                        }
                      }
                    }
                  }
                }
              }
            }
            translate ([-31, -13, 3]) {
              translate ([-36.42059678255161, -13.748592644796744, 45.42143047760381]) {
                rotate (a=25.0, v=[0, 0, 1]) {
                  rotate (a=-23.000000000000004, v=[0, 1, 0]) {
                    rotate (a=7.999999999999999, v=[1, 0, 0]) {
                      translate ([8.524999999999999, -8.524999999999999, 0]) {
                        translate ([0, 0, 2]) {
                          cube ([0.1, 0.1, 4], center=true);
                        }
                      }
                    }
                  }
                }
              }
            }
          }
          hull () {
            translate ([-22, -36, -3]) {
              translate ([-36.42059678255161, -13.748592644796744, 45.42143047760381]) {
                rotate (a=25.0, v=[0, 0, 1]) {
                  rotate (a=-23.000000000000004, v=[0, 1, 0]) {
                    rotate (a=-1.9999999999999998, v=[1, 0, 0]) {
                      translate ([8.524999999999999, 8.524999999999999, 0]) {
                        translate ([0, 0, 2]) {
                          cube ([0.1, 0.1, 4], center=true);
                        }
                      }
                    }
                  }
                }
              }
            }
            translate ([-31, -13, 3]) {
              translate ([-36.42059678255161, -13.748592644796744, 45.42143047760381]) {
                rotate (a=25.0, v=[0, 0, 1]) {
                  rotate (a=-23.000000000000004, v=[0, 1, 0]) {
                    rotate (a=7.999999999999999, v=[1, 0, 0]) {
                      translate ([8.524999999999999, -8.524999999999999, 0]) {
                        translate ([0, 0, 2]) {
                          cube ([0.1, 0.1, 4], center=true);
                        }
                      }
                    }
                  }
                }
              }
            }
            translate ([-22, -36, -3]) {
              translate ([-36.42059678255161, -13.748592644796744, 45.42143047760381]) {
                rotate (a=25.0, v=[0, 0, 1]) {
                  rotate (a=-23.000000000000004, v=[0, 1, 0]) {
                    rotate (a=-1.9999999999999998, v=[1, 0, 0]) {
                      translate ([8.524999999999999, 8.524999999999999, 0]) {
                        translate ([0, 0, 2]) {
                          cube ([0.1, 0.1, 4], center=true);
                        }
                      }
                    }
                  }
                }
              }
            }
          }
          hull () {
            translate ([-31, -13, 3]) {
              translate ([-36.42059678255161, -13.748592644796744, 45.42143047760381]) {
                rotate (a=25.0, v=[0, 0, 1]) {
                  rotate (a=-23.000000000000004, v=[0, 1, 0]) {
                    rotate (a=7.999999999999999, v=[1, 0, 0]) {
                      translate ([8.524999999999999, -8.524999999999999, 0]) {
                        translate ([0, 0, 2]) {
                          cube ([0.1, 0.1, 4], center=true);
                        }
                      }
                    }
                  }
                }
              }
            }
            translate ([-22, -36, -3]) {
              translate ([-36.42059678255161, -13.748592644796744, 45.42143047760381]) {
                rotate (a=25.0, v=[0, 0, 1]) {
                  rotate (a=-23.000000000000004, v=[0, 1, 0]) {
                    rotate (a=-1.9999999999999998, v=[1, 0, 0]) {
                      translate ([8.524999999999999, 8.524999999999999, 0]) {
                        translate ([0, 0, 2]) {
                          cube ([0.1, 0.1, 4], center=true);
                        }
                      }
                    }
                  }
                }
              }
            }
            translate ([-8, -24, 4]) {
              translate ([-36.42059678255161, -13.748592644796744, 45.42143047760381]) {
                rotate (a=10.000000000000002, v=[0, 0, 1]) {
                  rotate (a=-5.000000000000001, v=[0, 1, 0]) {
                    rotate (a=0.0, v=[1, 0, 0]) {
                      translate ([-8.524999999999999, 8.524999999999999, 0]) {
                        translate ([0, 0, 2]) {
                          cube ([0.1, 0.1, 4], center=true);
                        }
                      }
                    }
                  }
                }
              }
            }
          }
        }
        union () {
          hull () {
            translate ([-31, -13, 3]) {
              translate ([-36.42059678255161, -13.748592644796744, 45.42143047760381]) {
                rotate (a=25.0, v=[0, 0, 1]) {
                  rotate (a=-23.000000000000004, v=[0, 1, 0]) {
                    rotate (a=7.999999999999999, v=[1, 0, 0]) {
                      translate ([-8.524999999999999, 8.524999999999999, 0]) {
                        translate ([0, 0, 2]) {
                          cube ([0.1, 0.1, 4], center=true);
                        }
                      }
                    }
                  }
                }
              }
            }
            translate ([-46, -22, -7]) {
              translate ([-36.42059678255161, -13.748592644796744, 45.42143047760381]) {
                rotate (a=34.99999999999999, v=[0, 0, 1]) {
                  rotate (a=-36.0, v=[0, 1, 0]) {
                    rotate (a=1.9999999999999998, v=[1, 0, 0]) {
                      translate ([8.524999999999999, 8.524999999999999, 0]) {
                        translate ([0, 0, 2]) {
                          cube ([0.1, 0.1, 4], center=true);
                        }
                      }
                    }
                  }
                }
              }
            }
            translate ([-31, -13, 3]) {
              translate ([-36.42059678255161, -13.748592644796744, 45.42143047760381]) {
                rotate (a=25.0, v=[0, 0, 1]) {
                  rotate (a=-23.000000000000004, v=[0, 1, 0]) {
                    rotate (a=7.999999999999999, v=[1, 0, 0]) {
                      translate ([-8.524999999999999, -8.524999999999999, 0]) {
                        translate ([0, 0, 2]) {
                          cube ([0.1, 0.1, 4], center=true);
                        }
                      }
                    }
                  }
                }
              }
            }
          }
          hull () {
            translate ([-46, -22, -7]) {
              translate ([-36.42059678255161, -13.748592644796744, 45.42143047760381]) {
                rotate (a=34.99999999999999, v=[0, 0, 1]) {
                  rotate (a=-36.0, v=[0, 1, 0]) {
                    rotate (a=1.9999999999999998, v=[1, 0, 0]) {
                      translate ([8.524999999999999, 8.524999999999999, 0]) {
                        translate ([0, 0, 2]) {
                          cube ([0.1, 0.1, 4], center=true);
                        }
                      }
                    }
                  }
                }
              }
            }
            translate ([-31, -13, 3]) {
              translate ([-36.42059678255161, -13.748592644796744, 45.42143047760381]) {
                rotate (a=25.0, v=[0, 0, 1]) {
                  rotate (a=-23.000000000000004, v=[0, 1, 0]) {
                    rotate (a=7.999999999999999, v=[1, 0, 0]) {
                      translate ([-8.524999999999999, -8.524999999999999, 0]) {
                        translate ([0, 0, 2]) {
                          cube ([0.1, 0.1, 4], center=true);
                        }
                      }
                    }
                  }
                }
              }
            }
            translate ([-46, -22, -7]) {
              translate ([-36.42059678255161, -13.748592644796744, 45.42143047760381]) {
                rotate (a=34.99999999999999, v=[0, 0, 1]) {
                  rotate (a=-36.0, v=[0, 1, 0]) {
                    rotate (a=1.9999999999999998, v=[1, 0, 0]) {
                      translate ([8.524999999999999, -8.524999999999999, 0]) {
                        translate ([0, 0, 2]) {
                          cube ([0.1, 0.1, 4], center=true);
                        }
                      }
                    }
                  }
                }
              }
            }
          }
          hull () {
            translate ([-31, -13, 3]) {
              translate ([-36.42059678255161, -13.748592644796744, 45.42143047760381]) {
                rotate (a=25.0, v=[0, 0, 1]) {
                  rotate (a=-23.000000000000004, v=[0, 1, 0]) {
                    rotate (a=7.999999999999999, v=[1, 0, 0]) {
                      translate ([-8.524999999999999, -8.524999999999999, 0]) {
                        translate ([0, 0, 2]) {
                          cube ([0.1, 0.1, 4], center=true);
                        }
                      }
                    }
                  }
                }
              }
            }
            translate ([-46, -22, -7]) {
              translate ([-36.42059678255161, -13.748592644796744, 45.42143047760381]) {
                rotate (a=34.99999999999999, v=[0, 0, 1]) {
                  rotate (a=-36.0, v=[0, 1, 0]) {
                    rotate (a=1.9999999999999998, v=[1, 0, 0]) {
                      translate ([8.524999999999999, -8.524999999999999, 0]) {
                        translate ([0, 0, 2]) {
                          cube ([0.1, 0.1, 4], center=true);
                        }
                      }
                    }
                  }
                }
              }
            }
            translate ([-22, -36, -3]) {
              translate ([-36.42059678255161, -13.748592644796744, 45.42143047760381]) {
                rotate (a=25.0, v=[0, 0, 1]) {
                  rotate (a=-23.000000000000004, v=[0, 1, 0]) {
                    rotate (a=-1.9999999999999998, v=[1, 0, 0]) {
                      translate ([8.524999999999999, 8.524999999999999, 0]) {
                        translate ([0, 0, 2]) {
                          cube ([0.1, 0.1, 4], center=true);
                        }
                      }
                    }
                  }
                }
              }
            }
          }
          hull () {
            translate ([-46, -22, -7]) {
              translate ([-36.42059678255161, -13.748592644796744, 45.42143047760381]) {
                rotate (a=34.99999999999999, v=[0, 0, 1]) {
                  rotate (a=-36.0, v=[0, 1, 0]) {
                    rotate (a=1.9999999999999998, v=[1, 0, 0]) {
                      translate ([8.524999999999999, -8.524999999999999, 0]) {
                        translate ([0, 0, 2]) {
                          cube ([0.1, 0.1, 4], center=true);
                        }
                      }
                    }
                  }
                }
              }
            }
            translate ([-22, -36, -3]) {
              translate ([-36.42059678255161, -13.748592644796744, 45.42143047760381]) {
                rotate (a=25.0, v=[0, 0, 1]) {
                  rotate (a=-23.000000000000004, v=[0, 1, 0]) {
                    rotate (a=-1.9999999999999998, v=[1, 0, 0]) {
                      translate ([8.524999999999999, 8.524999999999999, 0]) {
                        translate ([0, 0, 2]) {
                          cube ([0.1, 0.1, 4], center=true);
                        }
                      }
                    }
                  }
                }
              }
            }
            translate ([-31, -13, 3]) {
              translate ([-36.42059678255161, -13.748592644796744, 45.42143047760381]) {
                rotate (a=25.0, v=[0, 0, 1]) {
                  rotate (a=-23.000000000000004, v=[0, 1, 0]) {
                    rotate (a=7.999999999999999, v=[1, 0, 0]) {
                      translate ([-8.524999999999999, -8.524999999999999, 0]) {
                        translate ([0, 0, 2]) {
                          cube ([0.1, 0.1, 4], center=true);
                        }
                      }
                    }
                  }
                }
              }
            }
          }
          hull () {
            translate ([-22, -36, -3]) {
              translate ([-36.42059678255161, -13.748592644796744, 45.42143047760381]) {
                rotate (a=25.0, v=[0, 0, 1]) {
                  rotate (a=-23.000000000000004, v=[0, 1, 0]) {
                    rotate (a=-1.9999999999999998, v=[1, 0, 0]) {
                      translate ([8.524999999999999, 8.524999999999999, 0]) {
                        translate ([0, 0, 2]) {
                          cube ([0.1, 0.1, 4], center=true);
                        }
                      }
                    }
                  }
                }
              }
            }
            translate ([-31, -13, 3]) {
              translate ([-36.42059678255161, -13.748592644796744, 45.42143047760381]) {
                rotate (a=25.0, v=[0, 0, 1]) {
                  rotate (a=-23.000000000000004, v=[0, 1, 0]) {
                    rotate (a=7.999999999999999, v=[1, 0, 0]) {
                      translate ([-8.524999999999999, -8.524999999999999, 0]) {
                        translate ([0, 0, 2]) {
                          cube ([0.1, 0.1, 4], center=true);
                        }
                      }
                    }
                  }
                }
              }
            }
            translate ([-31, -13, 3]) {
              translate ([-36.42059678255161, -13.748592644796744, 45.42143047760381]) {
                rotate (a=25.0, v=[0, 0, 1]) {
                  rotate (a=-23.000000000000004, v=[0, 1, 0]) {
                    rotate (a=7.999999999999999, v=[1, 0, 0]) {
                      translate ([8.524999999999999, -8.524999999999999, 0]) {
                        translate ([0, 0, 2]) {
                          cube ([0.1, 0.1, 4], center=true);
                        }
                      }
                    }
                  }
                }
              }
            }
          }
          hull () {
            translate ([-31, -13, 3]) {
              translate ([-36.42059678255161, -13.748592644796744, 45.42143047760381]) {
                rotate (a=25.0, v=[0, 0, 1]) {
                  rotate (a=-23.000000000000004, v=[0, 1, 0]) {
                    rotate (a=7.999999999999999, v=[1, 0, 0]) {
                      translate ([-8.524999999999999, -8.524999999999999, 0]) {
                        translate ([0, 0, 2]) {
                          cube ([0.1, 0.1, 4], center=true);
                        }
                      }
                    }
                  }
                }
              }
            }
            translate ([-31, -13, 3]) {
              translate ([-36.42059678255161, -13.748592644796744, 45.42143047760381]) {
                rotate (a=25.0, v=[0, 0, 1]) {
                  rotate (a=-23.000000000000004, v=[0, 1, 0]) {
                    rotate (a=7.999999999999999, v=[1, 0, 0]) {
                      translate ([8.524999999999999, -8.524999999999999, 0]) {
                        translate ([0, 0, 2]) {
                          cube ([0.1, 0.1, 4], center=true);
                        }
                      }
                    }
                  }
                }
              }
            }
            translate ([-22, -36, -3]) {
              translate ([-36.42059678255161, -13.748592644796744, 45.42143047760381]) {
                rotate (a=25.0, v=[0, 0, 1]) {
                  rotate (a=-23.000000000000004, v=[0, 1, 0]) {
                    rotate (a=-1.9999999999999998, v=[1, 0, 0]) {
                      translate ([8.524999999999999, 8.524999999999999, 0]) {
                        translate ([0, 0, 2]) {
                          cube ([0.1, 0.1, 4], center=true);
                        }
                      }
                    }
                  }
                }
              }
            }
          }
        }
      }
    }
    union () {
      translate ([-22, -36, -3]) {
        translate ([-36.42059678255161, -13.748592644796744, 45.42143047760381]) {
          rotate (a=25.0, v=[0, 0, 1]) {
            rotate (a=-23.000000000000004, v=[0, 1, 0]) {
              rotate (a=-1.9999999999999998, v=[1, 0, 0]) {
                difference () {
                  hull () {
                    hull () {
                      translate ([-8.524999999999999, -8.524999999999999, 0]) {
                        translate ([0, 0, 2]) {
                          cube ([0.1, 0.1, 4], center=true);
                        }
                      }
                      translate ([8.524999999999999, -8.524999999999999, 0]) {
                        translate ([0, 0, 2]) {
                          cube ([0.1, 0.1, 4], center=true);
                        }
                      }
                    }
                    translate ([0, 0, 2]) {
                      translate ([0, -13.575, 0]) {
                        cylinder (h=4, r=4, center=true);
                      }
                    }
                  }
                  translate ([0, 0, 2]) {
                    translate ([0, -13.575, 0]) {
                      cylinder ($fn=30, h=6, r=1.65, center=true);
                    }
                  }
                }
              }
            }
          }
        }
      }
      translate ([-46, -22, -7]) {
        translate ([-36.42059678255161, -13.748592644796744, 45.42143047760381]) {
          rotate (a=34.99999999999999, v=[0, 0, 1]) {
            rotate (a=-36.0, v=[0, 1, 0]) {
              rotate (a=1.9999999999999998, v=[1, 0, 0]) {
                difference () {
                  hull () {
                    hull () {
                      translate ([-8.524999999999999, 8.524999999999999, 0]) {
                        translate ([0, 0, 2]) {
                          cube ([0.1, 0.1, 4], center=true);
                        }
                      }
                      translate ([8.524999999999999, 8.524999999999999, 0]) {
                        translate ([0, 0, 2]) {
                          cube ([0.1, 0.1, 4], center=true);
                        }
                      }
                    }
                    translate ([0, 0, 2]) {
                      translate ([0, 13.575, 0]) {
                        cylinder (h=4, r=4, center=true);
                      }
                    }
                  }
                  translate ([0, 0, 2]) {
                    translate ([0, 13.575, 0]) {
                      cylinder ($fn=30, h=6, r=1.65, center=true);
                    }
                  }
                }
              }
            }
          }
        }
      }
    }
  }
}
